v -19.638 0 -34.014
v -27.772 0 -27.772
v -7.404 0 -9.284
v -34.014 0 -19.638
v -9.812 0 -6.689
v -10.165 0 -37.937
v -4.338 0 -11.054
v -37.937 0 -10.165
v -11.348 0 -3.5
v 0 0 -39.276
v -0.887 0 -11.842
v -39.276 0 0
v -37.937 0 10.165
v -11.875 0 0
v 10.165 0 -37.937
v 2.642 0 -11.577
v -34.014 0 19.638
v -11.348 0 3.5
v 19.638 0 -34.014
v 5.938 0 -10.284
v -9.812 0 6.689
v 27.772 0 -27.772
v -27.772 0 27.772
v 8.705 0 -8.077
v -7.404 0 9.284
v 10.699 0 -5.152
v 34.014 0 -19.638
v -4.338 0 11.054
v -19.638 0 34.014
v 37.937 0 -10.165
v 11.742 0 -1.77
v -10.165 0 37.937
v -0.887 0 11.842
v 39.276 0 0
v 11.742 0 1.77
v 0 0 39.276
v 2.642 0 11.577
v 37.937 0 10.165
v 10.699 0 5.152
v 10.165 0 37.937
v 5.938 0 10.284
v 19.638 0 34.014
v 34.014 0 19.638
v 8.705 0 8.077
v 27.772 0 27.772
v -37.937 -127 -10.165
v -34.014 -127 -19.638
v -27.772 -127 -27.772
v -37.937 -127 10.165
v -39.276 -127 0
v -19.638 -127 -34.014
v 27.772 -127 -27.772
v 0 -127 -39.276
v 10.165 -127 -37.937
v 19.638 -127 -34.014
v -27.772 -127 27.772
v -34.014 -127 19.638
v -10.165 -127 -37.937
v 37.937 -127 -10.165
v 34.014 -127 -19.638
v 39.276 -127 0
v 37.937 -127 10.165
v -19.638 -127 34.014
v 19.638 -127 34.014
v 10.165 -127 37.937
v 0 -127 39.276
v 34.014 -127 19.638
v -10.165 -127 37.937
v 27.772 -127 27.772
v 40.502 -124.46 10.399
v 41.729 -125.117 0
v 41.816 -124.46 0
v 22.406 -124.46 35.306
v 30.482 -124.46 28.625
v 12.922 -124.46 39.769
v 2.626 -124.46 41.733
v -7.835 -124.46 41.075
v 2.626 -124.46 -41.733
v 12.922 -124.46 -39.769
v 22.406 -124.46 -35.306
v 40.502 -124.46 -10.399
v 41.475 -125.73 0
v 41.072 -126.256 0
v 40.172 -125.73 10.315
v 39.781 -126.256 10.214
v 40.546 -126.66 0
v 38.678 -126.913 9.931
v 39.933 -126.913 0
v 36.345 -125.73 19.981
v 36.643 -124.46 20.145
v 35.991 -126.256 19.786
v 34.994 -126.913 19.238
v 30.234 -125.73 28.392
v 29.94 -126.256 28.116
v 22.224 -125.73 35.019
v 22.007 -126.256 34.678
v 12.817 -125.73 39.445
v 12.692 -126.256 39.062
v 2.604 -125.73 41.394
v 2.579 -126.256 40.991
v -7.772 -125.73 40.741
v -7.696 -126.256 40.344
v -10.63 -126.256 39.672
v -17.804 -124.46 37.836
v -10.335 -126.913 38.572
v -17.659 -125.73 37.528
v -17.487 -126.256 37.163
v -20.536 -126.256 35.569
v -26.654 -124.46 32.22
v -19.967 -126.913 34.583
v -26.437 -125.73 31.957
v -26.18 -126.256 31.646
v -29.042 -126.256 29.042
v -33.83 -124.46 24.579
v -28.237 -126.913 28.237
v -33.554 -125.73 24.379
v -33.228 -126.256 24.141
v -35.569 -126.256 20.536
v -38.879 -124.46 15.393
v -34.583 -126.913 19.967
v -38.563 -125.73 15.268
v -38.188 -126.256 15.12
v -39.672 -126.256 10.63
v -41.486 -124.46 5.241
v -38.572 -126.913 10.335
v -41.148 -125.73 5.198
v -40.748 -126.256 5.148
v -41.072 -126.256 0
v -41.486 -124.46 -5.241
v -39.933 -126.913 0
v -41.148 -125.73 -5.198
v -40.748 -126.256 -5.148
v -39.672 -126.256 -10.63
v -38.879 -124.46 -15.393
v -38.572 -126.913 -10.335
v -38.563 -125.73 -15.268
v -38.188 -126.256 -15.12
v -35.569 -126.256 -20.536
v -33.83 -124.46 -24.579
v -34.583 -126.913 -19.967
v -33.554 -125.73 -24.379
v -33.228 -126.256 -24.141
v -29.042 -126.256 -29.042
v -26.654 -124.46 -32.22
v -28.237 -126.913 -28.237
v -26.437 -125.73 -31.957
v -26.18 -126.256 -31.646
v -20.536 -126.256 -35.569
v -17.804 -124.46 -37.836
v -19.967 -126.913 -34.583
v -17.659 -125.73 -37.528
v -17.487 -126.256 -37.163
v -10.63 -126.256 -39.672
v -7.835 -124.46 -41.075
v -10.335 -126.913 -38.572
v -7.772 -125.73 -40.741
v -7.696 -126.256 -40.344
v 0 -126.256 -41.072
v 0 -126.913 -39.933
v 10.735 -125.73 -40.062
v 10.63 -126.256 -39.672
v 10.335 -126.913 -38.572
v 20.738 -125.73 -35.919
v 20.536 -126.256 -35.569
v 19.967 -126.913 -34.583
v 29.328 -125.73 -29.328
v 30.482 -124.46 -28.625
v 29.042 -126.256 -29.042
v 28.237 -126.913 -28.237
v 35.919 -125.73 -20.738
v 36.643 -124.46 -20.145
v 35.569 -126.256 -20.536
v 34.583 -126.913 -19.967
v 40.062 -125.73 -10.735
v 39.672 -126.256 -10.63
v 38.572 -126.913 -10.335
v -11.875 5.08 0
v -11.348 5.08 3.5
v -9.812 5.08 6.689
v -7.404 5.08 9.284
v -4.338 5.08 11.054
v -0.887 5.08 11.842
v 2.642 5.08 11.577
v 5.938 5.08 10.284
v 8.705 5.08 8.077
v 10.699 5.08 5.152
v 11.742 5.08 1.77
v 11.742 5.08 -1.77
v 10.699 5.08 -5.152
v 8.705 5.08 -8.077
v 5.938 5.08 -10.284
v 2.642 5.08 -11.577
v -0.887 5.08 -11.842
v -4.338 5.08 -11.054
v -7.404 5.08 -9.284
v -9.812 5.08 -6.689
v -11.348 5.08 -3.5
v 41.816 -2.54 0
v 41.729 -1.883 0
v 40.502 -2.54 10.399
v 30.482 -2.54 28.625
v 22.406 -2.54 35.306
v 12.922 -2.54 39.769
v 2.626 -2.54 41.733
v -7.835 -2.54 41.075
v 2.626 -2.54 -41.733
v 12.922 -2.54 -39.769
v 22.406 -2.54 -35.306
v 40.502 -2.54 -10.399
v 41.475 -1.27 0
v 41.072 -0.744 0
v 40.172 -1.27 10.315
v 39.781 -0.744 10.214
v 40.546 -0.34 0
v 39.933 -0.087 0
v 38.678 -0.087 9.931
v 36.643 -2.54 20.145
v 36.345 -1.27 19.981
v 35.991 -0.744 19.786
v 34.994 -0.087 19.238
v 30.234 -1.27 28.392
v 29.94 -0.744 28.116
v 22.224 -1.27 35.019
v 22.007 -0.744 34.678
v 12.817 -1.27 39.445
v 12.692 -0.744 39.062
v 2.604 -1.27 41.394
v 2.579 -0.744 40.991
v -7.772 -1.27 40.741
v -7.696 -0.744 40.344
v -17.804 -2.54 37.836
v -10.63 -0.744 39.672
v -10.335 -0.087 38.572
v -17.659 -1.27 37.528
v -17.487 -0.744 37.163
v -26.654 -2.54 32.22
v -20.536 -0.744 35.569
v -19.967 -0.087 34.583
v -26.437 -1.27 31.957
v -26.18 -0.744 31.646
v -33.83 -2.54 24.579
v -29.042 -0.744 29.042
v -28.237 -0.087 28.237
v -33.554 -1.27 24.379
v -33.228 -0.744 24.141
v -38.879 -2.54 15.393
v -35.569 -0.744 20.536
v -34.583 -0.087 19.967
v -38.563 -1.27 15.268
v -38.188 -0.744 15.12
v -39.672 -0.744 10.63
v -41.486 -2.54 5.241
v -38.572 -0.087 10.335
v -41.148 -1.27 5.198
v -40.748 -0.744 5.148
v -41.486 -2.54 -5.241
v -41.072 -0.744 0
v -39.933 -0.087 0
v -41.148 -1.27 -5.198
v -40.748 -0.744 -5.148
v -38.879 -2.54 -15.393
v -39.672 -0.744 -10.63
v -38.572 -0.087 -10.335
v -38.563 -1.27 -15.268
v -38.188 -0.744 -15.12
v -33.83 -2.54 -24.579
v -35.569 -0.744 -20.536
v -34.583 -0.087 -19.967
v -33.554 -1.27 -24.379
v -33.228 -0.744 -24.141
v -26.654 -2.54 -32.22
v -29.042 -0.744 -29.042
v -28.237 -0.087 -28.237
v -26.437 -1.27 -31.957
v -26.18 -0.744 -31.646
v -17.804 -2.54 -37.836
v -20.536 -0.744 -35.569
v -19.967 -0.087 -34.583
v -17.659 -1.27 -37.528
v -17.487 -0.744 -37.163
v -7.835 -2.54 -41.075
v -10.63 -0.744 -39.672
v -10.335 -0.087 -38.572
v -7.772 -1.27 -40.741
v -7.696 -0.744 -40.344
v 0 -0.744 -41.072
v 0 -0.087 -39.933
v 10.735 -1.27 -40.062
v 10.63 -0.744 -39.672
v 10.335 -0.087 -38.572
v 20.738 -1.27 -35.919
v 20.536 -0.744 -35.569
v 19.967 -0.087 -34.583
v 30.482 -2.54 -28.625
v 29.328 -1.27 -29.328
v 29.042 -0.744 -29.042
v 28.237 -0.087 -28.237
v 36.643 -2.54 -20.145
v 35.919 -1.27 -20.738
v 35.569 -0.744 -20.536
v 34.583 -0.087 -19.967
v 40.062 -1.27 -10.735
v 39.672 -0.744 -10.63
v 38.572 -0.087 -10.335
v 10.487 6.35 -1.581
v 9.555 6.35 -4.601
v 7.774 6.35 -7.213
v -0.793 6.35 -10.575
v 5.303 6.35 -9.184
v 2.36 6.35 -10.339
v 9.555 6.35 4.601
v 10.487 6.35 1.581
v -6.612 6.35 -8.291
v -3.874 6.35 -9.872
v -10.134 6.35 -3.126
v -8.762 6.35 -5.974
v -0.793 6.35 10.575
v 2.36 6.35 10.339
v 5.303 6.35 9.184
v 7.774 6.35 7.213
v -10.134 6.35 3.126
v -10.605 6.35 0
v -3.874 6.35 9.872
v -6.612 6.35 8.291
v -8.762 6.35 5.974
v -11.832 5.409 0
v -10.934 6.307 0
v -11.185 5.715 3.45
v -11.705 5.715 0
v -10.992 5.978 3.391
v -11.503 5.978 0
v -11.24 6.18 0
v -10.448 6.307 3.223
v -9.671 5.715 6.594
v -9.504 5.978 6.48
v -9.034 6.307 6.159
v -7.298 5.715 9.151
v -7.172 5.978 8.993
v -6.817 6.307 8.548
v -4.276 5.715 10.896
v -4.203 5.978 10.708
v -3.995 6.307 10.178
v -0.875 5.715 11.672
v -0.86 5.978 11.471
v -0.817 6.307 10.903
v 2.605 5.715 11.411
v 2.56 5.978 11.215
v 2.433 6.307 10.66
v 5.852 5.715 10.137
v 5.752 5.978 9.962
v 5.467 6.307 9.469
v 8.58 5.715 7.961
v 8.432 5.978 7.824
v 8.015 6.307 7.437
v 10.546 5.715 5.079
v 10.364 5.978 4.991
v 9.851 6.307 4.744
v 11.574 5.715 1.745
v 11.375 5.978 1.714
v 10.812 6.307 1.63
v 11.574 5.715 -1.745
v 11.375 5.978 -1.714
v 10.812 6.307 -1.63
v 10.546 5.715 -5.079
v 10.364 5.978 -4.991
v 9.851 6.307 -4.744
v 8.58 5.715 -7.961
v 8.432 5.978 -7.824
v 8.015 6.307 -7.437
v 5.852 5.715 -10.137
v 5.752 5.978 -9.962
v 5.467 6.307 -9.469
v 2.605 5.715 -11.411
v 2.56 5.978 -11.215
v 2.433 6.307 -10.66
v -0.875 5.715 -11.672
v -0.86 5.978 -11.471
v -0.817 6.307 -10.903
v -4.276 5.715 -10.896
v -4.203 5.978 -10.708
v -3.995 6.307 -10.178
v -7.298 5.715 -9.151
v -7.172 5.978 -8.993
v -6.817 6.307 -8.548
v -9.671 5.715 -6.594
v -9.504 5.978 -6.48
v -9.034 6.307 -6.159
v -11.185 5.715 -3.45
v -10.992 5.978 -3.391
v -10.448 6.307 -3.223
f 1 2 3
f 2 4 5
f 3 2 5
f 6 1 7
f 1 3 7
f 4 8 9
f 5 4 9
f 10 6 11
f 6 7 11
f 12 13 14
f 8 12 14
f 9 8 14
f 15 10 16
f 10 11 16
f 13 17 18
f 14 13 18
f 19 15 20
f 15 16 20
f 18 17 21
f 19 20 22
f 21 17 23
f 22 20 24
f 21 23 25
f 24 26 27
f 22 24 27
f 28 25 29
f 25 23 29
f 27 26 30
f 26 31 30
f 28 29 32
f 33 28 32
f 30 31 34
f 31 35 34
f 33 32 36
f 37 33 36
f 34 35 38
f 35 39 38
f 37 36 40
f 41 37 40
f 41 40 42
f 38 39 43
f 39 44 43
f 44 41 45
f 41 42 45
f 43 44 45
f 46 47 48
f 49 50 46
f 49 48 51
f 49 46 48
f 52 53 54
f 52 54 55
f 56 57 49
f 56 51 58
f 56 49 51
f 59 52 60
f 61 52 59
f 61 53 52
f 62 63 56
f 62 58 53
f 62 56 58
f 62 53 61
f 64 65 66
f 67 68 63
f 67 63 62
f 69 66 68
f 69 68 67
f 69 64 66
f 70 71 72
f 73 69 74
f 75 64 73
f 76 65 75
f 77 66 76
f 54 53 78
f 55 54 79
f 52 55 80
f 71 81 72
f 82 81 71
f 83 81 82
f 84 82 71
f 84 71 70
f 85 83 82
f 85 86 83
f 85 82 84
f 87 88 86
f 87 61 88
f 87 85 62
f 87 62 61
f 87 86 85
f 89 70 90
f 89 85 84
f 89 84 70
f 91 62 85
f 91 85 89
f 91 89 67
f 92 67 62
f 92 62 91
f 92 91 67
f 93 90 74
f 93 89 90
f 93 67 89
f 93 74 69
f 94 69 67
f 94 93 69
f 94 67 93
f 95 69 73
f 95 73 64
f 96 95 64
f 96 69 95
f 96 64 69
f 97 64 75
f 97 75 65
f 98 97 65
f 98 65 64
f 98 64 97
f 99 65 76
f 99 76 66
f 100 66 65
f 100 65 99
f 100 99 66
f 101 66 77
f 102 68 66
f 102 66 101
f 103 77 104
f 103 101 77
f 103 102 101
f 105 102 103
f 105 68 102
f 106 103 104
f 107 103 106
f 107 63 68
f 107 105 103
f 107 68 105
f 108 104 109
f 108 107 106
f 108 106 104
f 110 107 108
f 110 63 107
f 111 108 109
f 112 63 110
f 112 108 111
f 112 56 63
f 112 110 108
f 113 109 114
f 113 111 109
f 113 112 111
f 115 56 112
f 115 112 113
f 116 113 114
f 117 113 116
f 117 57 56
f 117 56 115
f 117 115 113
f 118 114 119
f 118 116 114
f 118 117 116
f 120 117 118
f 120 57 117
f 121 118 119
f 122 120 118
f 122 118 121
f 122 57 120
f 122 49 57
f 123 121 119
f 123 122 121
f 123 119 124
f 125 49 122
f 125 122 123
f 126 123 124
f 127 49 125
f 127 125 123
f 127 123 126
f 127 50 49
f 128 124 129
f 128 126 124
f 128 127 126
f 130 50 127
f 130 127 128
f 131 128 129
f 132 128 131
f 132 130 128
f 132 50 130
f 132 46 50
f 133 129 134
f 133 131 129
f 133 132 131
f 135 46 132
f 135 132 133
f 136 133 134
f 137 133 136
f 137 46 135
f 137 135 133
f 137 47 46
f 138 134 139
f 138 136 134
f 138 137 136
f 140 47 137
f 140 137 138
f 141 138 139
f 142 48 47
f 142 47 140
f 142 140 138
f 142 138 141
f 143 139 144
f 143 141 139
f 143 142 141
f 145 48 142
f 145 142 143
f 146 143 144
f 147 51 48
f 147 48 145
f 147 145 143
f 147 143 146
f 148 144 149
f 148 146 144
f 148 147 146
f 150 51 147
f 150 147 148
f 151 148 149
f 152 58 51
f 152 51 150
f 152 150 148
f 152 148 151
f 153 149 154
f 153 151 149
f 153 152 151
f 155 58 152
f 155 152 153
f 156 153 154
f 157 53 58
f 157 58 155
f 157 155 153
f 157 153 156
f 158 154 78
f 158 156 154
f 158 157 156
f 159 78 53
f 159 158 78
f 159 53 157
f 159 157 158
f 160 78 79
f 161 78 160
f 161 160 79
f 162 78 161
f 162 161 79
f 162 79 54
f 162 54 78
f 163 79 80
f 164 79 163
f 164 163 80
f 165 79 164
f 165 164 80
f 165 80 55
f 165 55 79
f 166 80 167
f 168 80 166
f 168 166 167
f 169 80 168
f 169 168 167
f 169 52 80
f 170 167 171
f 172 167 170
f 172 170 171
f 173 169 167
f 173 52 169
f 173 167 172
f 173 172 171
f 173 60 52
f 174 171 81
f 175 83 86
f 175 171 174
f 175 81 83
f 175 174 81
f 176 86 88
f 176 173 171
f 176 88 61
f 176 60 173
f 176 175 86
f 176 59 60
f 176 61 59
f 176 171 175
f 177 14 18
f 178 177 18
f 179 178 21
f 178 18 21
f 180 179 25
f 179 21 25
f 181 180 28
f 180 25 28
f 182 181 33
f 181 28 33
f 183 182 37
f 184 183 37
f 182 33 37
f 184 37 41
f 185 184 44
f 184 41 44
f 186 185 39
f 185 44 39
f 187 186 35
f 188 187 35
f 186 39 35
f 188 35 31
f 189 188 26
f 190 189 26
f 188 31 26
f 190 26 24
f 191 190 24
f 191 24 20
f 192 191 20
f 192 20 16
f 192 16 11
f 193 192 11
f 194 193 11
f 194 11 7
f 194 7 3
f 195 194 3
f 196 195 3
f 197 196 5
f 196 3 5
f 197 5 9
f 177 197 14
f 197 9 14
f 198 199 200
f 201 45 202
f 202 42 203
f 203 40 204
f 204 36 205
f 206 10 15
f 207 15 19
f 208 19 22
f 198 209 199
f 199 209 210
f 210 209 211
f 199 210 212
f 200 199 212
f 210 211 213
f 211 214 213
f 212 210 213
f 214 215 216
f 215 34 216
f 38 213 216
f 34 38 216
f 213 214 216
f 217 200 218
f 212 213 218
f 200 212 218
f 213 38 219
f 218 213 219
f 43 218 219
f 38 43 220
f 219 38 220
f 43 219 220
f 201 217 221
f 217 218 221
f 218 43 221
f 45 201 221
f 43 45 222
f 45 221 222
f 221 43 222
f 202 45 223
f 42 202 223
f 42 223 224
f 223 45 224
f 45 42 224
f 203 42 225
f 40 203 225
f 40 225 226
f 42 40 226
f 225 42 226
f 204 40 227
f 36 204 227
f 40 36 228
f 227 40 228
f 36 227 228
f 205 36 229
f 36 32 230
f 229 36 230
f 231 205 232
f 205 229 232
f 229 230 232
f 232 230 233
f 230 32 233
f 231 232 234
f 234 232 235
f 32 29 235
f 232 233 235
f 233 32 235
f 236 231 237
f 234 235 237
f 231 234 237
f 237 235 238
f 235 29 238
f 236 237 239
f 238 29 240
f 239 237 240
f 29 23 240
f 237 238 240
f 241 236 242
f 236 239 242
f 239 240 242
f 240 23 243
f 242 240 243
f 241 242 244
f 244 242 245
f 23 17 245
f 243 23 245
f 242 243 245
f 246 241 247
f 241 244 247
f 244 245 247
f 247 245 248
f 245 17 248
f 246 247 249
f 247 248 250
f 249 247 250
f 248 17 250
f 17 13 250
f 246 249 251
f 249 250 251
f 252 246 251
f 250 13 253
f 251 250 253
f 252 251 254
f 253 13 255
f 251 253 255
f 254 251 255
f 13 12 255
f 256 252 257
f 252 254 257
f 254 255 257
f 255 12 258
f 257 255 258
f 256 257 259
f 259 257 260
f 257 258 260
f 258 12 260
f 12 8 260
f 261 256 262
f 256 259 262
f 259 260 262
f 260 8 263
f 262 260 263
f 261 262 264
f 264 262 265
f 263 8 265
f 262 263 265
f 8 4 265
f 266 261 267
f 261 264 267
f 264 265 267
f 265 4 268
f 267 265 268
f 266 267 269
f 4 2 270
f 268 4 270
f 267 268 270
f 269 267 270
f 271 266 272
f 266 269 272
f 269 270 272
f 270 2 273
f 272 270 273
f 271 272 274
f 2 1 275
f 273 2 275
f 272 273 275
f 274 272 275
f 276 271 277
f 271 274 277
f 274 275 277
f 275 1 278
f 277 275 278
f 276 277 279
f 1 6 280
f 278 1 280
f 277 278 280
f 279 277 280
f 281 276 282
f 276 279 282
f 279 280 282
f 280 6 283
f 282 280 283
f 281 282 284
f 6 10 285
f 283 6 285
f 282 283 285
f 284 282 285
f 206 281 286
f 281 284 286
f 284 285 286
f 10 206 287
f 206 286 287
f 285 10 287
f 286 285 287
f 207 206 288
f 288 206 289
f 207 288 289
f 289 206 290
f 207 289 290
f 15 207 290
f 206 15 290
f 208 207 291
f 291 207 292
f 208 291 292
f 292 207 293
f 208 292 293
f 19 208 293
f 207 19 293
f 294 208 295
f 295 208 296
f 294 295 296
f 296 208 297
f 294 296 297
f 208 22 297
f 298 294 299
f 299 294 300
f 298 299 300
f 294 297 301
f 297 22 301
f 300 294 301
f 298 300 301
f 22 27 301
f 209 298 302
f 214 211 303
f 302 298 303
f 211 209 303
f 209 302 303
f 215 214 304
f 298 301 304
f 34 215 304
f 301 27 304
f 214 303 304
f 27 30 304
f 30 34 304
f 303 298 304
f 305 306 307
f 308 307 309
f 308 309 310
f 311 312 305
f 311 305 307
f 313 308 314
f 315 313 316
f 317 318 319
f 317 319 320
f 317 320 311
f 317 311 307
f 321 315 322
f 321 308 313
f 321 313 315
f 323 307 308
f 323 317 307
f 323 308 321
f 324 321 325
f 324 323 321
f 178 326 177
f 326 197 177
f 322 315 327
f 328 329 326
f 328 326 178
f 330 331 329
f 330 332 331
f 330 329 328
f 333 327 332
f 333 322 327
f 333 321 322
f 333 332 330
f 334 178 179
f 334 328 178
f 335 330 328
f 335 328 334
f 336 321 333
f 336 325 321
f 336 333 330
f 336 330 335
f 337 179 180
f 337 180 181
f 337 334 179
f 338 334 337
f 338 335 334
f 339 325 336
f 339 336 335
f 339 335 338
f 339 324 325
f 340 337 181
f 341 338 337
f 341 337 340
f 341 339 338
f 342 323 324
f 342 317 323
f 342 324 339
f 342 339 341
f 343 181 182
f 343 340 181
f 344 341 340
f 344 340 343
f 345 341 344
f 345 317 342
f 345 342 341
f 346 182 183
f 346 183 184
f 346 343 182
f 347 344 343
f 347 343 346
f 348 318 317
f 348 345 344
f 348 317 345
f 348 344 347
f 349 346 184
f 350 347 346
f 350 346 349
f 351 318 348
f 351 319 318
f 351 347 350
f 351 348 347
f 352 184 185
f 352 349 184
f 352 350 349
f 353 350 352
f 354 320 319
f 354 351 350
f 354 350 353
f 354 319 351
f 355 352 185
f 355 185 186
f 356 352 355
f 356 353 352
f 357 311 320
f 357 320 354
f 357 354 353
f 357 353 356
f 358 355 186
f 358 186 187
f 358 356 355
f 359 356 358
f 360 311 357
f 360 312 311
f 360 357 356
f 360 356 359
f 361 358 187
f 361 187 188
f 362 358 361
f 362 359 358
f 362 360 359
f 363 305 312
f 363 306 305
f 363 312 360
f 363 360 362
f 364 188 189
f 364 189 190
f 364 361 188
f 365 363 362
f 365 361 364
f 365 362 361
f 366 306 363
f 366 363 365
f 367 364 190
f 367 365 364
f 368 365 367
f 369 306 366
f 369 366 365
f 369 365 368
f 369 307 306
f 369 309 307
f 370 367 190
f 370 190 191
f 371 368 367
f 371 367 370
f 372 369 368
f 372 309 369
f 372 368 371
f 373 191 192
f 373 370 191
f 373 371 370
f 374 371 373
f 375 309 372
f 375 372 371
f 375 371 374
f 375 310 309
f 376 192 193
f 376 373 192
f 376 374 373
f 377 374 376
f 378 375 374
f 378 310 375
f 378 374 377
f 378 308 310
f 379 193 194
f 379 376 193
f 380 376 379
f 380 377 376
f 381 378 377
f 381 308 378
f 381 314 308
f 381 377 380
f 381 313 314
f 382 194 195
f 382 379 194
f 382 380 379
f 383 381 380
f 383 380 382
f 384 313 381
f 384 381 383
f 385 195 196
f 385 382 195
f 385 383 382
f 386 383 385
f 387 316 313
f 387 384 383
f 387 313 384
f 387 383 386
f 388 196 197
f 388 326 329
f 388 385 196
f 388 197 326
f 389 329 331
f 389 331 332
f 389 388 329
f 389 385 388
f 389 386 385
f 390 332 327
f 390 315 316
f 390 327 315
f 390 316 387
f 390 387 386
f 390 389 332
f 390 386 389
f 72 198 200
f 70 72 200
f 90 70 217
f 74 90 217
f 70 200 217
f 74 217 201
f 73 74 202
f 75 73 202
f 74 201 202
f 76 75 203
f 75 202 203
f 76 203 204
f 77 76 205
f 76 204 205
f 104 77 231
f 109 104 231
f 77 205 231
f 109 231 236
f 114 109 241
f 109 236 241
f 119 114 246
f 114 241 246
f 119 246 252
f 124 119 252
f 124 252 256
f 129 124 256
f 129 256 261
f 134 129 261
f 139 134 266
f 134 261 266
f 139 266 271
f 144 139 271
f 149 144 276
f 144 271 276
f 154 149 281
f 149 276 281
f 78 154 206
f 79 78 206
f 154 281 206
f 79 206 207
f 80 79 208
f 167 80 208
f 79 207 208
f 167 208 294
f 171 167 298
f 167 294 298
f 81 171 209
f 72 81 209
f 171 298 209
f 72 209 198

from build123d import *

# Parameters (mm, degrees)
F0_R     = 41.81566
F1_DEPTH = 127
F2_R     = 11.875081
F3_DEPTH = 6.35
F4_R     = 2.54
F5_R     = 2.54
F6_R     = 1.27


with BuildPart() as f1:
    # F0 (on Front) → F1 (new body)
    with BuildSketch(Plane.XZ):
        Circle(F0_R)
    extrude(amount=F1_DEPTH)

    # F2 (on face) → F3 (join)
    with BuildSketch(Plane(origin=(0, 0, 0), x_dir=(-1, 0, 0), z_dir=(0, 1, 0))):
        Circle(F2_R)
    extrude(amount=F3_DEPTH)

    # F4
    f4_edges = [f1.edges().sort_by_distance(p)[0] for p in [
        (-41.81566, 0, 0),
    ]]
    fillet(f4_edges, radius=F4_R)

    # F5
    f5_edges = [f1.edges().sort_by_distance(p)[0] for p in [
        (-41.81566, -127, 0),
    ]]
    fillet(f5_edges, radius=F5_R)

    # F6
    f6_edges = [f1.edges().sort_by_distance(p)[0] for p in [
        (11.875081, 6.35, 0),
    ]]
    fillet(f6_edges, radius=F6_R)


solid = f1.part
